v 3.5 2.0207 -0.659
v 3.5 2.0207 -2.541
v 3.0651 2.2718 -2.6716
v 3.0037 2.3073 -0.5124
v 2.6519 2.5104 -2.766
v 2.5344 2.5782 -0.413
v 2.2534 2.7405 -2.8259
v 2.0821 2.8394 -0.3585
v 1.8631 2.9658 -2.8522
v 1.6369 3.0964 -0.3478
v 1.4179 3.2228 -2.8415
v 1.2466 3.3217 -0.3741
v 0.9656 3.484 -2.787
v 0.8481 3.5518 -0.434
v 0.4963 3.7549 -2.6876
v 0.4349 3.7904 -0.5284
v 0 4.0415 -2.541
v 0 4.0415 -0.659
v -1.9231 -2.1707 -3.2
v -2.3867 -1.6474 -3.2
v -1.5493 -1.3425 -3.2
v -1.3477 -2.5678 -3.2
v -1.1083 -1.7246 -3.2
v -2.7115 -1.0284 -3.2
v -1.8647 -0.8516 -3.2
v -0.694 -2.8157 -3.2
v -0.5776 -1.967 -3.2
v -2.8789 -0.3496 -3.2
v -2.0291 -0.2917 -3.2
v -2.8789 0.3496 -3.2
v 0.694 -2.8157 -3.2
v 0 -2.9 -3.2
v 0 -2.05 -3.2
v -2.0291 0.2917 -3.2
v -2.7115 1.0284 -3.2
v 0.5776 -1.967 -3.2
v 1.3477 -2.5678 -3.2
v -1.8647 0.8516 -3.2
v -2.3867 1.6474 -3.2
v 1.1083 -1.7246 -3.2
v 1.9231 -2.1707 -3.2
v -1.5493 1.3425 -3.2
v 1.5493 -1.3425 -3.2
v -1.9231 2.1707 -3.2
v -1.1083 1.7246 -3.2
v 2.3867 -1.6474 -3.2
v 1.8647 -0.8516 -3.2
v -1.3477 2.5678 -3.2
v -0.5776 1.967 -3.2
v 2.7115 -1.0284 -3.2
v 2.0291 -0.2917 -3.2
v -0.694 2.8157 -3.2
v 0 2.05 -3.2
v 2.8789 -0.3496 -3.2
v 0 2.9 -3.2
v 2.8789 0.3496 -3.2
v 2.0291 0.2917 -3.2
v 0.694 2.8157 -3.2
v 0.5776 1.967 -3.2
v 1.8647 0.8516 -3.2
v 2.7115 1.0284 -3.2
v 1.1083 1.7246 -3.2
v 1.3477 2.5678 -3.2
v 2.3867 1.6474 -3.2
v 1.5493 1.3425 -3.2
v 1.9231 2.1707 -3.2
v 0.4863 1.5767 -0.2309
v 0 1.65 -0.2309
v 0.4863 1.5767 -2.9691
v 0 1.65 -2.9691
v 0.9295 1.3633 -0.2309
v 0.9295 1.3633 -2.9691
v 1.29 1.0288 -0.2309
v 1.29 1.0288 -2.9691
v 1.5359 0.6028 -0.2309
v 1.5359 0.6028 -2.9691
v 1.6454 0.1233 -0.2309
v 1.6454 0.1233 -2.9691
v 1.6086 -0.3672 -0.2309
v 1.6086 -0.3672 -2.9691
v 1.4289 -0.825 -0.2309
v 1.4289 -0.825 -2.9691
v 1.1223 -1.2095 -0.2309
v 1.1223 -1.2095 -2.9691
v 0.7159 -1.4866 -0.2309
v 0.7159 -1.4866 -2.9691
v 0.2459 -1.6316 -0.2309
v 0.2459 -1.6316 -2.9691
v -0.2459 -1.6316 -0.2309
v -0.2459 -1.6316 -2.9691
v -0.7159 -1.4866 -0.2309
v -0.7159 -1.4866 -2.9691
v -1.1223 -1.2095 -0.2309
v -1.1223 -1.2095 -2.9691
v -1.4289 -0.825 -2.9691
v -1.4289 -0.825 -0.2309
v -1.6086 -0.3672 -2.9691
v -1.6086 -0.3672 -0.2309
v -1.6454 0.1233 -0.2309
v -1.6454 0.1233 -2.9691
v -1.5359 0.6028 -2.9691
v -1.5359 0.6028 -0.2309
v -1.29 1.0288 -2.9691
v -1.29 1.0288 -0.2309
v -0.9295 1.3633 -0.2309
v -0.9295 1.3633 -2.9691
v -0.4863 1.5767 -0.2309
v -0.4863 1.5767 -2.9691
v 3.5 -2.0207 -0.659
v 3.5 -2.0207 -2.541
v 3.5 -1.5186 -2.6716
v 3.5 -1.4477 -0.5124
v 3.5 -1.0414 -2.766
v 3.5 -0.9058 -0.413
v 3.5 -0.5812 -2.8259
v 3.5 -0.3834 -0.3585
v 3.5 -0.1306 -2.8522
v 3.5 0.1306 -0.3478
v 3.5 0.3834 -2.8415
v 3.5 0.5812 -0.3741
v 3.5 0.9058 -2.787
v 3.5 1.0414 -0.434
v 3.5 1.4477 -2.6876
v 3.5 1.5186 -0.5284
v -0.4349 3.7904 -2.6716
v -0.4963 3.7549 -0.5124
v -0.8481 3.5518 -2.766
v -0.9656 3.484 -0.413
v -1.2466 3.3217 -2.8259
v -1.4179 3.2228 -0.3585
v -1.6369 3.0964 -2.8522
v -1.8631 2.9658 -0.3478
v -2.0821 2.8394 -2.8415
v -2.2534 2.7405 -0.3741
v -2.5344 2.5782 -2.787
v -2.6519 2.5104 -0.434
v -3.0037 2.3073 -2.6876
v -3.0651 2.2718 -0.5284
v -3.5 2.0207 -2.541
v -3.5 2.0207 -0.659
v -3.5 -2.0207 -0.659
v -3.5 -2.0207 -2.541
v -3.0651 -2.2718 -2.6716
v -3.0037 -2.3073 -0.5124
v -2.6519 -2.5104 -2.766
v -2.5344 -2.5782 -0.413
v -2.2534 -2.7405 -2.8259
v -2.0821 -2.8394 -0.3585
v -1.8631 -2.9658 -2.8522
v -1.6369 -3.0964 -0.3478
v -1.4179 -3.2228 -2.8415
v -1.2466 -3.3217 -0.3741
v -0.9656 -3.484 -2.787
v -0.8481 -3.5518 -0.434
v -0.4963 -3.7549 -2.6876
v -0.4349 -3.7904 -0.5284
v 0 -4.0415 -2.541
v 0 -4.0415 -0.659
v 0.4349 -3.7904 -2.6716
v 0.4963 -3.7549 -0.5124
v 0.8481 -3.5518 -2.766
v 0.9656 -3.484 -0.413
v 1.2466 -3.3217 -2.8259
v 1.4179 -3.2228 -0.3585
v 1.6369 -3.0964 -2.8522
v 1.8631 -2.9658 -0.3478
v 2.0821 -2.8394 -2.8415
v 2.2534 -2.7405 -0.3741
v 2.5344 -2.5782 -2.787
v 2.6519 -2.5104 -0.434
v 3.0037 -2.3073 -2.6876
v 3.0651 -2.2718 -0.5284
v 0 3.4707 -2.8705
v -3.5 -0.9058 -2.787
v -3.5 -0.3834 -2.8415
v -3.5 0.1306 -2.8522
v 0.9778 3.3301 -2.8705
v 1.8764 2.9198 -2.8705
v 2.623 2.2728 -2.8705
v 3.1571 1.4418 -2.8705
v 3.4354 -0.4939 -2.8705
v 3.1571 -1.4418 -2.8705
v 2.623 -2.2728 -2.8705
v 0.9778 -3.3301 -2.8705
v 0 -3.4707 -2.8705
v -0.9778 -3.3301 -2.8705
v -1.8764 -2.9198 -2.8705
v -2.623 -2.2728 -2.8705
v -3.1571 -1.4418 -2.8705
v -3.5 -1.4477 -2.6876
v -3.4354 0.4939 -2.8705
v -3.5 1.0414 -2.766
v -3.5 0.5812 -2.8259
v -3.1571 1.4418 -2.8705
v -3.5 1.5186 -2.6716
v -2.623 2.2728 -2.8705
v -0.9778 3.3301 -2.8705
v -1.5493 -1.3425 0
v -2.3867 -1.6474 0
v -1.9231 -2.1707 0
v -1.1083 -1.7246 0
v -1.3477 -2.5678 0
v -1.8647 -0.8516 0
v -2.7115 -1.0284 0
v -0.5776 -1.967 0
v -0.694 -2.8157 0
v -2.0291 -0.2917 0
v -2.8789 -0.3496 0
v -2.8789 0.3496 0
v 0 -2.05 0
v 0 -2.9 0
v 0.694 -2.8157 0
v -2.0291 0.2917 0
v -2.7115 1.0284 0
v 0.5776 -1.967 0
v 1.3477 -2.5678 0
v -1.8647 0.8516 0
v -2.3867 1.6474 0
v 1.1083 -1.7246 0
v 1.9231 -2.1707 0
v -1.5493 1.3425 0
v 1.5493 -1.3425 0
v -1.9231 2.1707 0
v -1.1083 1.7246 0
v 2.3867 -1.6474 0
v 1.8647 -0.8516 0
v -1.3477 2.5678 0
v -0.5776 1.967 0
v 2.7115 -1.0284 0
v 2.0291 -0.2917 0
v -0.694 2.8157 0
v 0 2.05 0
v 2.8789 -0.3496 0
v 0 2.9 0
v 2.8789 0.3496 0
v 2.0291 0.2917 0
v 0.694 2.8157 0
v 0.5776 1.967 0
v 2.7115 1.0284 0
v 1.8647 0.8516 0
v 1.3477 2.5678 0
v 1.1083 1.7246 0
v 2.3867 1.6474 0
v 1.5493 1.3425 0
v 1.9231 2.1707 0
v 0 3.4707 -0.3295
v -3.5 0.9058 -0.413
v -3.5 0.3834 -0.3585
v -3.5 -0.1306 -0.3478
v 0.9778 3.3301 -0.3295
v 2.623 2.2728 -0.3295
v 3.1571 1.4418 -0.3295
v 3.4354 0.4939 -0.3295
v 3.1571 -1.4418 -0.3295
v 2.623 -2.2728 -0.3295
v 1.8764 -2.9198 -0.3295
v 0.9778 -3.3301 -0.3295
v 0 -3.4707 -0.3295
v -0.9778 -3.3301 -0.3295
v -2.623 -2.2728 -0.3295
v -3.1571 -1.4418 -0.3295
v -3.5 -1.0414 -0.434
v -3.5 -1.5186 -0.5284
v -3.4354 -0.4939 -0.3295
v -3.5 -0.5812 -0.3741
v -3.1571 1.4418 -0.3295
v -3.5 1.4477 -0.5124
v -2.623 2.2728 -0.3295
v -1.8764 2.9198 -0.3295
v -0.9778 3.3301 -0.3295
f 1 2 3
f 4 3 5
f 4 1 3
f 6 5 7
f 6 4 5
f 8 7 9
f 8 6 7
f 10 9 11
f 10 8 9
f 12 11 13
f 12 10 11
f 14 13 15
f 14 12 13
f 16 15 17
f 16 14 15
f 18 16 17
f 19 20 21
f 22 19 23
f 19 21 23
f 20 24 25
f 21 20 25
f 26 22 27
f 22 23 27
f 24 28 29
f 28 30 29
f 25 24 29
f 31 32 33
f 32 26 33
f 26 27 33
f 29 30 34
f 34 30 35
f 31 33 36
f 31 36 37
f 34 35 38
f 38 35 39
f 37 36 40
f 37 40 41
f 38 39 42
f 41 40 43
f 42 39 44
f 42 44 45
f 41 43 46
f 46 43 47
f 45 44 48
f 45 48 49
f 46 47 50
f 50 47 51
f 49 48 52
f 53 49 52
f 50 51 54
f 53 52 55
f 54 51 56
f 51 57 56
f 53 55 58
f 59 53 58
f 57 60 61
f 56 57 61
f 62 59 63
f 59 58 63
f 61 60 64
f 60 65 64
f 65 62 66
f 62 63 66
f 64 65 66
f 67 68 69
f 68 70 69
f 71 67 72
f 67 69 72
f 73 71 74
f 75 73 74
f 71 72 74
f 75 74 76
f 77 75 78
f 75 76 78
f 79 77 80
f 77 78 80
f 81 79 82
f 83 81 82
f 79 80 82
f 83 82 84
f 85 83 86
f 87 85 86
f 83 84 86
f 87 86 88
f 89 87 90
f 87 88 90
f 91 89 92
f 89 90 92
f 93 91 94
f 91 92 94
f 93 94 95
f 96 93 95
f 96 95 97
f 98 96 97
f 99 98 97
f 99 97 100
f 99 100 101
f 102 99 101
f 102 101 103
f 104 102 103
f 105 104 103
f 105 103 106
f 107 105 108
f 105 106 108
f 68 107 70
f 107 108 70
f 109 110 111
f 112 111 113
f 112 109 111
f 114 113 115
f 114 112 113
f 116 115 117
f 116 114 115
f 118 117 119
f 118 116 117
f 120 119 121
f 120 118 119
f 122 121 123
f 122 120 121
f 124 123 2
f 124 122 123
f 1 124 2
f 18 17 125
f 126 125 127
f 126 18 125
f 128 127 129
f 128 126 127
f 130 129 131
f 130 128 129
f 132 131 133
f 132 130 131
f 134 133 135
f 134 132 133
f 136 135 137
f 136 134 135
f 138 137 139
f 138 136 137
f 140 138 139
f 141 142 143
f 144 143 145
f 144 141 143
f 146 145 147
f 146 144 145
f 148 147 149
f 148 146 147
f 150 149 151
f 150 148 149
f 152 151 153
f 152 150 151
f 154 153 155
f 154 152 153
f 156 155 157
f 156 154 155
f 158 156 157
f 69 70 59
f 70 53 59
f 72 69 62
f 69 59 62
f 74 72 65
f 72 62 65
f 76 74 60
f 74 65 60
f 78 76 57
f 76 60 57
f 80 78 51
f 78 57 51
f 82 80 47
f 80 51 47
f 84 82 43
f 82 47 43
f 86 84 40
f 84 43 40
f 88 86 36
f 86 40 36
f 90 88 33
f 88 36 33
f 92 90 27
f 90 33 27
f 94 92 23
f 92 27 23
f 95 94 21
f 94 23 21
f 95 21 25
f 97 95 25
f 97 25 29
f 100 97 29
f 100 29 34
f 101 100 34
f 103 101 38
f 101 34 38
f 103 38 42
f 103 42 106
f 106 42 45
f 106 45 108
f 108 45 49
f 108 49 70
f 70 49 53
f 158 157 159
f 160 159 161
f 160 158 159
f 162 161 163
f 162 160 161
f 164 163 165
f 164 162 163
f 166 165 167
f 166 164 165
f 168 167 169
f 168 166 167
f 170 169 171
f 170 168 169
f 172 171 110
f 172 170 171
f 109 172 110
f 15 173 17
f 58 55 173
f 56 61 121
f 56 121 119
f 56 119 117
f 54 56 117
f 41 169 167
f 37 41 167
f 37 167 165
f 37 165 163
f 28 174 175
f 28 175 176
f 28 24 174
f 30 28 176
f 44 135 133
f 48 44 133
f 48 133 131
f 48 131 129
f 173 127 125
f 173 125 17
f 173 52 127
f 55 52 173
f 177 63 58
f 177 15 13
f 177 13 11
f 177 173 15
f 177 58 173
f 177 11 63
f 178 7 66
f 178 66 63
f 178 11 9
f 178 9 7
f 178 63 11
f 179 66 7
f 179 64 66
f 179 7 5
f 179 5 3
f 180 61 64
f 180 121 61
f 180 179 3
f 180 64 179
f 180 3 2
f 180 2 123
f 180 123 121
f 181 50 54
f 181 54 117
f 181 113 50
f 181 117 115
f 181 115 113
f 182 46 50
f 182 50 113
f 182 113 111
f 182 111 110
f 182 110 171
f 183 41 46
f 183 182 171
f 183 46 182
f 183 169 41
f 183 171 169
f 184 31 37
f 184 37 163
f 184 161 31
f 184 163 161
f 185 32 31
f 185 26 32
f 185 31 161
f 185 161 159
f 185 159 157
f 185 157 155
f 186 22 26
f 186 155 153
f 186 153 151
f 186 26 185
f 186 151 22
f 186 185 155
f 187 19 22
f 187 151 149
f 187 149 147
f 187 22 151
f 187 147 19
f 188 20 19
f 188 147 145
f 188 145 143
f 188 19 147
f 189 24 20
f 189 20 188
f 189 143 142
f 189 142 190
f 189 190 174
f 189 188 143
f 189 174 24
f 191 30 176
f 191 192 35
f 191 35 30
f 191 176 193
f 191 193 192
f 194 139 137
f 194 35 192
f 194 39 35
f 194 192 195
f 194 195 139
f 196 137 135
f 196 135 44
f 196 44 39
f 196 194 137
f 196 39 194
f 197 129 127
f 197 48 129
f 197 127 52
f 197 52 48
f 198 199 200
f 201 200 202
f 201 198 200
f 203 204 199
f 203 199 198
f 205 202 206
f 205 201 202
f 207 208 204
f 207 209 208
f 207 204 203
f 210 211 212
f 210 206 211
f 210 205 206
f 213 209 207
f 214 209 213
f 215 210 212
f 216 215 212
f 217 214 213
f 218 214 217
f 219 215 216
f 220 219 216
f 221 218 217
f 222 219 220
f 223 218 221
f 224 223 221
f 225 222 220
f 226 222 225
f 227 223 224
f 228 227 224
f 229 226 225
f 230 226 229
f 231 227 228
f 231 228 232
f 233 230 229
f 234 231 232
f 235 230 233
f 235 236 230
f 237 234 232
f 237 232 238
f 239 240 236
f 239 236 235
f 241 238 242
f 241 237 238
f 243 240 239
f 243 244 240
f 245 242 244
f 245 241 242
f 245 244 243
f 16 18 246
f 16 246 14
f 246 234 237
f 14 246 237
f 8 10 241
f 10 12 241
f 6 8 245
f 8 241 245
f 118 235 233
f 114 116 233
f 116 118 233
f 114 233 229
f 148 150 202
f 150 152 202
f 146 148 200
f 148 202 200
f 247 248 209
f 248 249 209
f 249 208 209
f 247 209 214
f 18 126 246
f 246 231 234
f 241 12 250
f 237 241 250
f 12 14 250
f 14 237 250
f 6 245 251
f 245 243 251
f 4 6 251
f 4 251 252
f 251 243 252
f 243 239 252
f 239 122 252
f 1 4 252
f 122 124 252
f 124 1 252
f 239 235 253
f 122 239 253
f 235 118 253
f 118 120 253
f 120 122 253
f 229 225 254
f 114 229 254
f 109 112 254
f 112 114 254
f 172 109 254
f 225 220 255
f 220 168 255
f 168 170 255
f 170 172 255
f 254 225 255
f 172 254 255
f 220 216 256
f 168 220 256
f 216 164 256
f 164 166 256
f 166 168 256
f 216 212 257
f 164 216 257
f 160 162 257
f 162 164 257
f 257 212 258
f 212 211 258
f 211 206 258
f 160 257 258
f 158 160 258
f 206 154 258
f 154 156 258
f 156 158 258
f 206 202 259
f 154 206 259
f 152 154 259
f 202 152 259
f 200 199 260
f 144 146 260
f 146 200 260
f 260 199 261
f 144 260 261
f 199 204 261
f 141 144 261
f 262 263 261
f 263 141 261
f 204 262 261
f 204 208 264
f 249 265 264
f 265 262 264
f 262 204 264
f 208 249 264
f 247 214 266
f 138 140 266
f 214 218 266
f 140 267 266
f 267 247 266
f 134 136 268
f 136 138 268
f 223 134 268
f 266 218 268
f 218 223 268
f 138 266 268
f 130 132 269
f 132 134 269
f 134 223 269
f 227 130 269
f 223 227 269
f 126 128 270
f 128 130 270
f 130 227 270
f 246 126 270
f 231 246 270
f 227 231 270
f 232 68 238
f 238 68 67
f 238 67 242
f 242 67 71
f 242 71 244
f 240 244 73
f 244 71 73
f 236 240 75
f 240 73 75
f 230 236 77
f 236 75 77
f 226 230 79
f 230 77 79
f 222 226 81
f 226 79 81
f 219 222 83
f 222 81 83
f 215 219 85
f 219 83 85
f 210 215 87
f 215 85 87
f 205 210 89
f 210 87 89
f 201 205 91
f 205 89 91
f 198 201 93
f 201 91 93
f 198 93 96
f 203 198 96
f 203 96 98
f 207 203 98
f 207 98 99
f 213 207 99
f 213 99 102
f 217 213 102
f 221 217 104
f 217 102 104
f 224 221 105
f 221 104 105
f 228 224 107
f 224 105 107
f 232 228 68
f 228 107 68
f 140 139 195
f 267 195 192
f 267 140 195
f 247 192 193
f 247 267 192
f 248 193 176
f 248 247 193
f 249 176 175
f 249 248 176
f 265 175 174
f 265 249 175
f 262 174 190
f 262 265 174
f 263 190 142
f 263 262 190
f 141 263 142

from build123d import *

# Parameters (mm, degrees)
BOSS_EXTRUDE1_DEPTH = 3.2


with BuildPart() as part:
    # Sketch1 → Boss-Extrude1 (new body)
    with BuildSketch(Plane.XY):
        Polygon((0, 4.041451884), (-3.5, 2.020725942), (-3.5, -2.020725942), (0, -4.041451884), (3.5, -2.020725942), (3.5, 2.020725942), align=None)
    extrude(amount=-BOSS_EXTRUDE1_DEPTH)

    # Sketch4 → Cut-Revolve1 (revolve, cut)
    with BuildSketch(Plane(origin=(0, 0, 0), x_dir=(0, 0, -1), z_dir=(1, 0, 0))):
        Polygon((3.2, 4.041451884), (2.540982447, 4.041451884), (3.2, 2.9), align=None)
        Polygon((0, 4.041451884), (0.659017553, 4.041451884), (0, 2.9), align=None)
    revolve(axis=Axis((0, 0, 0), (0, 0, -1)), mode=Mode.SUBTRACT)

    # Sketch5 → Cut-Revolve2 (revolve, cut)
    with BuildSketch(Plane(origin=(0, 0, 0), x_dir=(0, 0, -1), z_dir=(1, 0, 0))):
        Polygon((0, 0), (0, 2.05), (0.230940108, 1.65), (2.969059892, 1.65), (3.2, 2.05), (3.2, 0), align=None)
    revolve(axis=Axis((0, 0, 0), (0, 0, -1)), mode=Mode.SUBTRACT)


solid = part.part
